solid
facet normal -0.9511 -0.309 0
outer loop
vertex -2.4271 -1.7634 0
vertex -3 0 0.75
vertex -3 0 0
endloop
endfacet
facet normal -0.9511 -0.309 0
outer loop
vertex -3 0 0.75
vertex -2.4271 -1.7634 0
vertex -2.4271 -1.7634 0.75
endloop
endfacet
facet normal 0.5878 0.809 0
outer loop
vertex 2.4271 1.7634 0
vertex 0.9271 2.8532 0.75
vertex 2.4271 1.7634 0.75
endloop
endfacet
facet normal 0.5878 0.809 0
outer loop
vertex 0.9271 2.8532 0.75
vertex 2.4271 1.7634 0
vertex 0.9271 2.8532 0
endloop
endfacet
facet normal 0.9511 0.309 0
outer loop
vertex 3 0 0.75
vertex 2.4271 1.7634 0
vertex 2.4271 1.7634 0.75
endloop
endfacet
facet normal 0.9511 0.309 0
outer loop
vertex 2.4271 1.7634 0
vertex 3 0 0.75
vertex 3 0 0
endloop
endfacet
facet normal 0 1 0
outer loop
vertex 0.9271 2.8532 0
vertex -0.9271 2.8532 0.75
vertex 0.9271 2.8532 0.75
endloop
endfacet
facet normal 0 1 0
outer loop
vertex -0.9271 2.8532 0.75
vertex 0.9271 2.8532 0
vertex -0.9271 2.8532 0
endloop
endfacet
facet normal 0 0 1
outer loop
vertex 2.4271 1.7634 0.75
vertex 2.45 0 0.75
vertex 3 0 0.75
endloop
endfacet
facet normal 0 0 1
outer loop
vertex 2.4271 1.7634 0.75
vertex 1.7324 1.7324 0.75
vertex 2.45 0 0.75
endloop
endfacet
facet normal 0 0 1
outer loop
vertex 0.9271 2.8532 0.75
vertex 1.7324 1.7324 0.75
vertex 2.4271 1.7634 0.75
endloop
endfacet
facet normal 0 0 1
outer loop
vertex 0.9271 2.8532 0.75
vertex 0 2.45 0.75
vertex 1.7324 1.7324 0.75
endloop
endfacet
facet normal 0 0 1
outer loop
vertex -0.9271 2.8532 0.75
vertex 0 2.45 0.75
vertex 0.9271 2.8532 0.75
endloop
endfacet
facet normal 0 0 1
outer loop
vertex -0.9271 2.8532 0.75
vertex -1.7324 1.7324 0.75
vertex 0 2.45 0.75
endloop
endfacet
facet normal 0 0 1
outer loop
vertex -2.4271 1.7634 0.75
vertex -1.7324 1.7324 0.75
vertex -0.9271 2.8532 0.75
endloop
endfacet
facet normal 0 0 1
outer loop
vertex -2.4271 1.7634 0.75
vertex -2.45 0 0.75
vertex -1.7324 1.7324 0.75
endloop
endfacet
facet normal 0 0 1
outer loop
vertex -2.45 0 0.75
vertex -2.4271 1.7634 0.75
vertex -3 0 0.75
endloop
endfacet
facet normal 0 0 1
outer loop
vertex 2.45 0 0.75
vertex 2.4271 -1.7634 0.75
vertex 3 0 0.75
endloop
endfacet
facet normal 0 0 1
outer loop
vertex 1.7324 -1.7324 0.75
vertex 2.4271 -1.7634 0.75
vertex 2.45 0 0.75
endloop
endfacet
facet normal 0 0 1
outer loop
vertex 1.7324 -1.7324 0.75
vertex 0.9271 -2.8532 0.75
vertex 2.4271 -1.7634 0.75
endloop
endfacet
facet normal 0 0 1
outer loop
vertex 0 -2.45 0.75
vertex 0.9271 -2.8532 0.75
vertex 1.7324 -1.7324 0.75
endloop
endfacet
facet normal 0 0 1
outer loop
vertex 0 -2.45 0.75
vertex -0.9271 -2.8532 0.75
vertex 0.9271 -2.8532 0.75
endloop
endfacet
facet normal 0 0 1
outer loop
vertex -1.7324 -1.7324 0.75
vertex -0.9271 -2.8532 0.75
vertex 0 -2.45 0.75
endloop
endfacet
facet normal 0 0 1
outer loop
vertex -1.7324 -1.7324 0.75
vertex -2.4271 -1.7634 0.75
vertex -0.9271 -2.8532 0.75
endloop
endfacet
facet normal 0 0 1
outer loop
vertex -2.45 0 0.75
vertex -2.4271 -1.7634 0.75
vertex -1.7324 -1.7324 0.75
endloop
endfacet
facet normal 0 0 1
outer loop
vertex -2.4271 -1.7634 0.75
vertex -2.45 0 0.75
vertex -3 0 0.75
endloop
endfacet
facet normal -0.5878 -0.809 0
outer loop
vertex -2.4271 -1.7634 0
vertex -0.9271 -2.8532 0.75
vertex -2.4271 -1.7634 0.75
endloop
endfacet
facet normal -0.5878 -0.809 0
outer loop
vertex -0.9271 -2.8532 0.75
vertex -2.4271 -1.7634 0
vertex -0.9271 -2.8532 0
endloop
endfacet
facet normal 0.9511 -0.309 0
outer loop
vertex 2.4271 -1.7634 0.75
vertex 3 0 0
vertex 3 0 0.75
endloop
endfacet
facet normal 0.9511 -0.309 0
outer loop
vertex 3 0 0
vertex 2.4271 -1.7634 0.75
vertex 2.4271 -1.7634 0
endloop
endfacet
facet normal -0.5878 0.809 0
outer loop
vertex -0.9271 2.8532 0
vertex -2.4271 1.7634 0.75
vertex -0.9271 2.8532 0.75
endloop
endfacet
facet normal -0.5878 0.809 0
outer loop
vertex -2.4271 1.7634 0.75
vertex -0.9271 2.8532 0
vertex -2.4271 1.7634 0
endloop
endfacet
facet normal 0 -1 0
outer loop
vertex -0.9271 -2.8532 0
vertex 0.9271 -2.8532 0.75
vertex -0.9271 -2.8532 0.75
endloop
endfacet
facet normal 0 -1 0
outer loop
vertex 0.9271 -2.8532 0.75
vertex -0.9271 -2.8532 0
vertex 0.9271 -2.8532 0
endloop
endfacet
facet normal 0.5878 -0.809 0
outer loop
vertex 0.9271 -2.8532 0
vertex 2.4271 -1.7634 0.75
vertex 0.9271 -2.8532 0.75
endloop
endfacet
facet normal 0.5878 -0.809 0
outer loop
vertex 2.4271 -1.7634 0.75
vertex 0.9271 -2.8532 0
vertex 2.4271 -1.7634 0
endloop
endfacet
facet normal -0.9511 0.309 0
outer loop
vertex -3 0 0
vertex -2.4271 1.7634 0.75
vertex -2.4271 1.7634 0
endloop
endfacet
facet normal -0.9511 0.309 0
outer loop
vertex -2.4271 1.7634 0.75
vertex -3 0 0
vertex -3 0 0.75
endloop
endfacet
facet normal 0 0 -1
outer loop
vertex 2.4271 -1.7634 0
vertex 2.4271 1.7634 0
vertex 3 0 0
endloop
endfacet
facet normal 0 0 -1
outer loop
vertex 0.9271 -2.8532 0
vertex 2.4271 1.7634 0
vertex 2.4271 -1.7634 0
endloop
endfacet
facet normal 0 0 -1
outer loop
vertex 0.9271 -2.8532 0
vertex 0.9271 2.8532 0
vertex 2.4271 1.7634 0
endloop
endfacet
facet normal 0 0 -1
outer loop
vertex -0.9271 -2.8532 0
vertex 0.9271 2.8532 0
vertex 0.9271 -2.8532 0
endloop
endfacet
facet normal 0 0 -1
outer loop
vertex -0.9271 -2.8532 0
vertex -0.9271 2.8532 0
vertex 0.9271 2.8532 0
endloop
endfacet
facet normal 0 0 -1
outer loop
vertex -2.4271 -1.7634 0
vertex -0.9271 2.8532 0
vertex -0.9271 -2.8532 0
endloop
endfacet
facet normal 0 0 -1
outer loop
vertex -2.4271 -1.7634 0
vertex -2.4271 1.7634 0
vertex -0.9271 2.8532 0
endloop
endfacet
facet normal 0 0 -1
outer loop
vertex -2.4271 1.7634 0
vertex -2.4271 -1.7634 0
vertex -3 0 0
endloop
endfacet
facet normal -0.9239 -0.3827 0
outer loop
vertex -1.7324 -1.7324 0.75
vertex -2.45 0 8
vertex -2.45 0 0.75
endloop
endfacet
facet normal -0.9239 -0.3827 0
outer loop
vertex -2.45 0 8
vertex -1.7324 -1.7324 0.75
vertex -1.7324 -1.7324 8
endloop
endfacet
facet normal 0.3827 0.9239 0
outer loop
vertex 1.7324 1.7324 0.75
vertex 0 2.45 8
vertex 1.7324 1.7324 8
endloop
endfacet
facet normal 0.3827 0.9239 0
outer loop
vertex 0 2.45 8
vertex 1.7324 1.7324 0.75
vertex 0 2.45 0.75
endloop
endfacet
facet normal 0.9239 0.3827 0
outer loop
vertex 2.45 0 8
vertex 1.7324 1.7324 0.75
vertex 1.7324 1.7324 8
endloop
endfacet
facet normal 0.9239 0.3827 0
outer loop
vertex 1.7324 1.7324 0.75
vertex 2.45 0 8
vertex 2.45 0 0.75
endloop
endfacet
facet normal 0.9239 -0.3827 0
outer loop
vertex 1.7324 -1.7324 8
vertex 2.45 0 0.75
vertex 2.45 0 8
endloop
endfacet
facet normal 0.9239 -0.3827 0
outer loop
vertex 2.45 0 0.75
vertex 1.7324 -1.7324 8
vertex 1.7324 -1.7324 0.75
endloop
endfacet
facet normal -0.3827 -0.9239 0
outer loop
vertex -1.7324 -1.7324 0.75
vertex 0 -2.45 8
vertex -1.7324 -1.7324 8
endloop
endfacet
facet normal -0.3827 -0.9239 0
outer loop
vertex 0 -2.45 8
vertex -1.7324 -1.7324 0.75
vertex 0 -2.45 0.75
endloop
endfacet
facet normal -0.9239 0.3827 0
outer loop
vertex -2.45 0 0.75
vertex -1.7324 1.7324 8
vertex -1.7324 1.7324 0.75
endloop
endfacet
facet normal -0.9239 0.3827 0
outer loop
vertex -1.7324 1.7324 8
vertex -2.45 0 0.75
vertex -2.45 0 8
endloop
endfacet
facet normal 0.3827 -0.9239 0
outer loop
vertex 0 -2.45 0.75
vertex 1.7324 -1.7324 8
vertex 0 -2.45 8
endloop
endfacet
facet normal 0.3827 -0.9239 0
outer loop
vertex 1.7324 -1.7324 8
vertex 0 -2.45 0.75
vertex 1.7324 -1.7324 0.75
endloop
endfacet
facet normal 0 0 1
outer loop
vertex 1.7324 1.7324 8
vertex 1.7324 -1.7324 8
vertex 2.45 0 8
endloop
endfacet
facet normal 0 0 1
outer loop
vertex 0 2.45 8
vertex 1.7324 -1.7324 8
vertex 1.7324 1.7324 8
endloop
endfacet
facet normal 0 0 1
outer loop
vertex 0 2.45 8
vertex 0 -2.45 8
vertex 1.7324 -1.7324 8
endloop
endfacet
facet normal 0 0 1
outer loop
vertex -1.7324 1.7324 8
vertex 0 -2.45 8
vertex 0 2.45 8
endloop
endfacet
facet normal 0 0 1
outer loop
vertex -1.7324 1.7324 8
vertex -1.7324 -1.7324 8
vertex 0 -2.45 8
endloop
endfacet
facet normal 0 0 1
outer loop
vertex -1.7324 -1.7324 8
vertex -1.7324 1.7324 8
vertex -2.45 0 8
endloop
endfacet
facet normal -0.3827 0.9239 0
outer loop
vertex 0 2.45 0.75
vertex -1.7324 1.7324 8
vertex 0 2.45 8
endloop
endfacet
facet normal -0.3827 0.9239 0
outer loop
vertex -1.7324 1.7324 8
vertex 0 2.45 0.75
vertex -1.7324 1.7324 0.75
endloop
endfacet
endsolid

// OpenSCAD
// file: pin_dimensions_metric.scad
// rip dimensionless units: mm here.


lego_pin_main_diameter = 4.9;

// the symmetric half-length of the flanges on 2L and 3L pins.
// it extends equally into the length units it straddles.
lego_pin_flange_half_length = 0.75;

// diameter of said flange.
lego_pin_flange_diameter = 6.0;
// file: technic_base_metric.scad
// base "L" unit used for all technic pins, axles and regular thickness beams.
lego_technic_unit_length = 8.0;
// main file
include <technic_base_metric.scad>;
include <pin_dimensions_metric.scad>;

module lego_pin_flanged_base(units) {
	height = units * lego_technic_unit_length;
	flange_height = lego_pin_flange_half_length;

	assert(height >= flange_height, "pin not possible: shorter than flange length!")

	cylinder(h = flange_height, d = lego_pin_flange_diameter);
	cylinder(h = height, d = lego_pin_main_diameter);
}

//$fn = 256;
lego_pin_flanged_base(1.0);
